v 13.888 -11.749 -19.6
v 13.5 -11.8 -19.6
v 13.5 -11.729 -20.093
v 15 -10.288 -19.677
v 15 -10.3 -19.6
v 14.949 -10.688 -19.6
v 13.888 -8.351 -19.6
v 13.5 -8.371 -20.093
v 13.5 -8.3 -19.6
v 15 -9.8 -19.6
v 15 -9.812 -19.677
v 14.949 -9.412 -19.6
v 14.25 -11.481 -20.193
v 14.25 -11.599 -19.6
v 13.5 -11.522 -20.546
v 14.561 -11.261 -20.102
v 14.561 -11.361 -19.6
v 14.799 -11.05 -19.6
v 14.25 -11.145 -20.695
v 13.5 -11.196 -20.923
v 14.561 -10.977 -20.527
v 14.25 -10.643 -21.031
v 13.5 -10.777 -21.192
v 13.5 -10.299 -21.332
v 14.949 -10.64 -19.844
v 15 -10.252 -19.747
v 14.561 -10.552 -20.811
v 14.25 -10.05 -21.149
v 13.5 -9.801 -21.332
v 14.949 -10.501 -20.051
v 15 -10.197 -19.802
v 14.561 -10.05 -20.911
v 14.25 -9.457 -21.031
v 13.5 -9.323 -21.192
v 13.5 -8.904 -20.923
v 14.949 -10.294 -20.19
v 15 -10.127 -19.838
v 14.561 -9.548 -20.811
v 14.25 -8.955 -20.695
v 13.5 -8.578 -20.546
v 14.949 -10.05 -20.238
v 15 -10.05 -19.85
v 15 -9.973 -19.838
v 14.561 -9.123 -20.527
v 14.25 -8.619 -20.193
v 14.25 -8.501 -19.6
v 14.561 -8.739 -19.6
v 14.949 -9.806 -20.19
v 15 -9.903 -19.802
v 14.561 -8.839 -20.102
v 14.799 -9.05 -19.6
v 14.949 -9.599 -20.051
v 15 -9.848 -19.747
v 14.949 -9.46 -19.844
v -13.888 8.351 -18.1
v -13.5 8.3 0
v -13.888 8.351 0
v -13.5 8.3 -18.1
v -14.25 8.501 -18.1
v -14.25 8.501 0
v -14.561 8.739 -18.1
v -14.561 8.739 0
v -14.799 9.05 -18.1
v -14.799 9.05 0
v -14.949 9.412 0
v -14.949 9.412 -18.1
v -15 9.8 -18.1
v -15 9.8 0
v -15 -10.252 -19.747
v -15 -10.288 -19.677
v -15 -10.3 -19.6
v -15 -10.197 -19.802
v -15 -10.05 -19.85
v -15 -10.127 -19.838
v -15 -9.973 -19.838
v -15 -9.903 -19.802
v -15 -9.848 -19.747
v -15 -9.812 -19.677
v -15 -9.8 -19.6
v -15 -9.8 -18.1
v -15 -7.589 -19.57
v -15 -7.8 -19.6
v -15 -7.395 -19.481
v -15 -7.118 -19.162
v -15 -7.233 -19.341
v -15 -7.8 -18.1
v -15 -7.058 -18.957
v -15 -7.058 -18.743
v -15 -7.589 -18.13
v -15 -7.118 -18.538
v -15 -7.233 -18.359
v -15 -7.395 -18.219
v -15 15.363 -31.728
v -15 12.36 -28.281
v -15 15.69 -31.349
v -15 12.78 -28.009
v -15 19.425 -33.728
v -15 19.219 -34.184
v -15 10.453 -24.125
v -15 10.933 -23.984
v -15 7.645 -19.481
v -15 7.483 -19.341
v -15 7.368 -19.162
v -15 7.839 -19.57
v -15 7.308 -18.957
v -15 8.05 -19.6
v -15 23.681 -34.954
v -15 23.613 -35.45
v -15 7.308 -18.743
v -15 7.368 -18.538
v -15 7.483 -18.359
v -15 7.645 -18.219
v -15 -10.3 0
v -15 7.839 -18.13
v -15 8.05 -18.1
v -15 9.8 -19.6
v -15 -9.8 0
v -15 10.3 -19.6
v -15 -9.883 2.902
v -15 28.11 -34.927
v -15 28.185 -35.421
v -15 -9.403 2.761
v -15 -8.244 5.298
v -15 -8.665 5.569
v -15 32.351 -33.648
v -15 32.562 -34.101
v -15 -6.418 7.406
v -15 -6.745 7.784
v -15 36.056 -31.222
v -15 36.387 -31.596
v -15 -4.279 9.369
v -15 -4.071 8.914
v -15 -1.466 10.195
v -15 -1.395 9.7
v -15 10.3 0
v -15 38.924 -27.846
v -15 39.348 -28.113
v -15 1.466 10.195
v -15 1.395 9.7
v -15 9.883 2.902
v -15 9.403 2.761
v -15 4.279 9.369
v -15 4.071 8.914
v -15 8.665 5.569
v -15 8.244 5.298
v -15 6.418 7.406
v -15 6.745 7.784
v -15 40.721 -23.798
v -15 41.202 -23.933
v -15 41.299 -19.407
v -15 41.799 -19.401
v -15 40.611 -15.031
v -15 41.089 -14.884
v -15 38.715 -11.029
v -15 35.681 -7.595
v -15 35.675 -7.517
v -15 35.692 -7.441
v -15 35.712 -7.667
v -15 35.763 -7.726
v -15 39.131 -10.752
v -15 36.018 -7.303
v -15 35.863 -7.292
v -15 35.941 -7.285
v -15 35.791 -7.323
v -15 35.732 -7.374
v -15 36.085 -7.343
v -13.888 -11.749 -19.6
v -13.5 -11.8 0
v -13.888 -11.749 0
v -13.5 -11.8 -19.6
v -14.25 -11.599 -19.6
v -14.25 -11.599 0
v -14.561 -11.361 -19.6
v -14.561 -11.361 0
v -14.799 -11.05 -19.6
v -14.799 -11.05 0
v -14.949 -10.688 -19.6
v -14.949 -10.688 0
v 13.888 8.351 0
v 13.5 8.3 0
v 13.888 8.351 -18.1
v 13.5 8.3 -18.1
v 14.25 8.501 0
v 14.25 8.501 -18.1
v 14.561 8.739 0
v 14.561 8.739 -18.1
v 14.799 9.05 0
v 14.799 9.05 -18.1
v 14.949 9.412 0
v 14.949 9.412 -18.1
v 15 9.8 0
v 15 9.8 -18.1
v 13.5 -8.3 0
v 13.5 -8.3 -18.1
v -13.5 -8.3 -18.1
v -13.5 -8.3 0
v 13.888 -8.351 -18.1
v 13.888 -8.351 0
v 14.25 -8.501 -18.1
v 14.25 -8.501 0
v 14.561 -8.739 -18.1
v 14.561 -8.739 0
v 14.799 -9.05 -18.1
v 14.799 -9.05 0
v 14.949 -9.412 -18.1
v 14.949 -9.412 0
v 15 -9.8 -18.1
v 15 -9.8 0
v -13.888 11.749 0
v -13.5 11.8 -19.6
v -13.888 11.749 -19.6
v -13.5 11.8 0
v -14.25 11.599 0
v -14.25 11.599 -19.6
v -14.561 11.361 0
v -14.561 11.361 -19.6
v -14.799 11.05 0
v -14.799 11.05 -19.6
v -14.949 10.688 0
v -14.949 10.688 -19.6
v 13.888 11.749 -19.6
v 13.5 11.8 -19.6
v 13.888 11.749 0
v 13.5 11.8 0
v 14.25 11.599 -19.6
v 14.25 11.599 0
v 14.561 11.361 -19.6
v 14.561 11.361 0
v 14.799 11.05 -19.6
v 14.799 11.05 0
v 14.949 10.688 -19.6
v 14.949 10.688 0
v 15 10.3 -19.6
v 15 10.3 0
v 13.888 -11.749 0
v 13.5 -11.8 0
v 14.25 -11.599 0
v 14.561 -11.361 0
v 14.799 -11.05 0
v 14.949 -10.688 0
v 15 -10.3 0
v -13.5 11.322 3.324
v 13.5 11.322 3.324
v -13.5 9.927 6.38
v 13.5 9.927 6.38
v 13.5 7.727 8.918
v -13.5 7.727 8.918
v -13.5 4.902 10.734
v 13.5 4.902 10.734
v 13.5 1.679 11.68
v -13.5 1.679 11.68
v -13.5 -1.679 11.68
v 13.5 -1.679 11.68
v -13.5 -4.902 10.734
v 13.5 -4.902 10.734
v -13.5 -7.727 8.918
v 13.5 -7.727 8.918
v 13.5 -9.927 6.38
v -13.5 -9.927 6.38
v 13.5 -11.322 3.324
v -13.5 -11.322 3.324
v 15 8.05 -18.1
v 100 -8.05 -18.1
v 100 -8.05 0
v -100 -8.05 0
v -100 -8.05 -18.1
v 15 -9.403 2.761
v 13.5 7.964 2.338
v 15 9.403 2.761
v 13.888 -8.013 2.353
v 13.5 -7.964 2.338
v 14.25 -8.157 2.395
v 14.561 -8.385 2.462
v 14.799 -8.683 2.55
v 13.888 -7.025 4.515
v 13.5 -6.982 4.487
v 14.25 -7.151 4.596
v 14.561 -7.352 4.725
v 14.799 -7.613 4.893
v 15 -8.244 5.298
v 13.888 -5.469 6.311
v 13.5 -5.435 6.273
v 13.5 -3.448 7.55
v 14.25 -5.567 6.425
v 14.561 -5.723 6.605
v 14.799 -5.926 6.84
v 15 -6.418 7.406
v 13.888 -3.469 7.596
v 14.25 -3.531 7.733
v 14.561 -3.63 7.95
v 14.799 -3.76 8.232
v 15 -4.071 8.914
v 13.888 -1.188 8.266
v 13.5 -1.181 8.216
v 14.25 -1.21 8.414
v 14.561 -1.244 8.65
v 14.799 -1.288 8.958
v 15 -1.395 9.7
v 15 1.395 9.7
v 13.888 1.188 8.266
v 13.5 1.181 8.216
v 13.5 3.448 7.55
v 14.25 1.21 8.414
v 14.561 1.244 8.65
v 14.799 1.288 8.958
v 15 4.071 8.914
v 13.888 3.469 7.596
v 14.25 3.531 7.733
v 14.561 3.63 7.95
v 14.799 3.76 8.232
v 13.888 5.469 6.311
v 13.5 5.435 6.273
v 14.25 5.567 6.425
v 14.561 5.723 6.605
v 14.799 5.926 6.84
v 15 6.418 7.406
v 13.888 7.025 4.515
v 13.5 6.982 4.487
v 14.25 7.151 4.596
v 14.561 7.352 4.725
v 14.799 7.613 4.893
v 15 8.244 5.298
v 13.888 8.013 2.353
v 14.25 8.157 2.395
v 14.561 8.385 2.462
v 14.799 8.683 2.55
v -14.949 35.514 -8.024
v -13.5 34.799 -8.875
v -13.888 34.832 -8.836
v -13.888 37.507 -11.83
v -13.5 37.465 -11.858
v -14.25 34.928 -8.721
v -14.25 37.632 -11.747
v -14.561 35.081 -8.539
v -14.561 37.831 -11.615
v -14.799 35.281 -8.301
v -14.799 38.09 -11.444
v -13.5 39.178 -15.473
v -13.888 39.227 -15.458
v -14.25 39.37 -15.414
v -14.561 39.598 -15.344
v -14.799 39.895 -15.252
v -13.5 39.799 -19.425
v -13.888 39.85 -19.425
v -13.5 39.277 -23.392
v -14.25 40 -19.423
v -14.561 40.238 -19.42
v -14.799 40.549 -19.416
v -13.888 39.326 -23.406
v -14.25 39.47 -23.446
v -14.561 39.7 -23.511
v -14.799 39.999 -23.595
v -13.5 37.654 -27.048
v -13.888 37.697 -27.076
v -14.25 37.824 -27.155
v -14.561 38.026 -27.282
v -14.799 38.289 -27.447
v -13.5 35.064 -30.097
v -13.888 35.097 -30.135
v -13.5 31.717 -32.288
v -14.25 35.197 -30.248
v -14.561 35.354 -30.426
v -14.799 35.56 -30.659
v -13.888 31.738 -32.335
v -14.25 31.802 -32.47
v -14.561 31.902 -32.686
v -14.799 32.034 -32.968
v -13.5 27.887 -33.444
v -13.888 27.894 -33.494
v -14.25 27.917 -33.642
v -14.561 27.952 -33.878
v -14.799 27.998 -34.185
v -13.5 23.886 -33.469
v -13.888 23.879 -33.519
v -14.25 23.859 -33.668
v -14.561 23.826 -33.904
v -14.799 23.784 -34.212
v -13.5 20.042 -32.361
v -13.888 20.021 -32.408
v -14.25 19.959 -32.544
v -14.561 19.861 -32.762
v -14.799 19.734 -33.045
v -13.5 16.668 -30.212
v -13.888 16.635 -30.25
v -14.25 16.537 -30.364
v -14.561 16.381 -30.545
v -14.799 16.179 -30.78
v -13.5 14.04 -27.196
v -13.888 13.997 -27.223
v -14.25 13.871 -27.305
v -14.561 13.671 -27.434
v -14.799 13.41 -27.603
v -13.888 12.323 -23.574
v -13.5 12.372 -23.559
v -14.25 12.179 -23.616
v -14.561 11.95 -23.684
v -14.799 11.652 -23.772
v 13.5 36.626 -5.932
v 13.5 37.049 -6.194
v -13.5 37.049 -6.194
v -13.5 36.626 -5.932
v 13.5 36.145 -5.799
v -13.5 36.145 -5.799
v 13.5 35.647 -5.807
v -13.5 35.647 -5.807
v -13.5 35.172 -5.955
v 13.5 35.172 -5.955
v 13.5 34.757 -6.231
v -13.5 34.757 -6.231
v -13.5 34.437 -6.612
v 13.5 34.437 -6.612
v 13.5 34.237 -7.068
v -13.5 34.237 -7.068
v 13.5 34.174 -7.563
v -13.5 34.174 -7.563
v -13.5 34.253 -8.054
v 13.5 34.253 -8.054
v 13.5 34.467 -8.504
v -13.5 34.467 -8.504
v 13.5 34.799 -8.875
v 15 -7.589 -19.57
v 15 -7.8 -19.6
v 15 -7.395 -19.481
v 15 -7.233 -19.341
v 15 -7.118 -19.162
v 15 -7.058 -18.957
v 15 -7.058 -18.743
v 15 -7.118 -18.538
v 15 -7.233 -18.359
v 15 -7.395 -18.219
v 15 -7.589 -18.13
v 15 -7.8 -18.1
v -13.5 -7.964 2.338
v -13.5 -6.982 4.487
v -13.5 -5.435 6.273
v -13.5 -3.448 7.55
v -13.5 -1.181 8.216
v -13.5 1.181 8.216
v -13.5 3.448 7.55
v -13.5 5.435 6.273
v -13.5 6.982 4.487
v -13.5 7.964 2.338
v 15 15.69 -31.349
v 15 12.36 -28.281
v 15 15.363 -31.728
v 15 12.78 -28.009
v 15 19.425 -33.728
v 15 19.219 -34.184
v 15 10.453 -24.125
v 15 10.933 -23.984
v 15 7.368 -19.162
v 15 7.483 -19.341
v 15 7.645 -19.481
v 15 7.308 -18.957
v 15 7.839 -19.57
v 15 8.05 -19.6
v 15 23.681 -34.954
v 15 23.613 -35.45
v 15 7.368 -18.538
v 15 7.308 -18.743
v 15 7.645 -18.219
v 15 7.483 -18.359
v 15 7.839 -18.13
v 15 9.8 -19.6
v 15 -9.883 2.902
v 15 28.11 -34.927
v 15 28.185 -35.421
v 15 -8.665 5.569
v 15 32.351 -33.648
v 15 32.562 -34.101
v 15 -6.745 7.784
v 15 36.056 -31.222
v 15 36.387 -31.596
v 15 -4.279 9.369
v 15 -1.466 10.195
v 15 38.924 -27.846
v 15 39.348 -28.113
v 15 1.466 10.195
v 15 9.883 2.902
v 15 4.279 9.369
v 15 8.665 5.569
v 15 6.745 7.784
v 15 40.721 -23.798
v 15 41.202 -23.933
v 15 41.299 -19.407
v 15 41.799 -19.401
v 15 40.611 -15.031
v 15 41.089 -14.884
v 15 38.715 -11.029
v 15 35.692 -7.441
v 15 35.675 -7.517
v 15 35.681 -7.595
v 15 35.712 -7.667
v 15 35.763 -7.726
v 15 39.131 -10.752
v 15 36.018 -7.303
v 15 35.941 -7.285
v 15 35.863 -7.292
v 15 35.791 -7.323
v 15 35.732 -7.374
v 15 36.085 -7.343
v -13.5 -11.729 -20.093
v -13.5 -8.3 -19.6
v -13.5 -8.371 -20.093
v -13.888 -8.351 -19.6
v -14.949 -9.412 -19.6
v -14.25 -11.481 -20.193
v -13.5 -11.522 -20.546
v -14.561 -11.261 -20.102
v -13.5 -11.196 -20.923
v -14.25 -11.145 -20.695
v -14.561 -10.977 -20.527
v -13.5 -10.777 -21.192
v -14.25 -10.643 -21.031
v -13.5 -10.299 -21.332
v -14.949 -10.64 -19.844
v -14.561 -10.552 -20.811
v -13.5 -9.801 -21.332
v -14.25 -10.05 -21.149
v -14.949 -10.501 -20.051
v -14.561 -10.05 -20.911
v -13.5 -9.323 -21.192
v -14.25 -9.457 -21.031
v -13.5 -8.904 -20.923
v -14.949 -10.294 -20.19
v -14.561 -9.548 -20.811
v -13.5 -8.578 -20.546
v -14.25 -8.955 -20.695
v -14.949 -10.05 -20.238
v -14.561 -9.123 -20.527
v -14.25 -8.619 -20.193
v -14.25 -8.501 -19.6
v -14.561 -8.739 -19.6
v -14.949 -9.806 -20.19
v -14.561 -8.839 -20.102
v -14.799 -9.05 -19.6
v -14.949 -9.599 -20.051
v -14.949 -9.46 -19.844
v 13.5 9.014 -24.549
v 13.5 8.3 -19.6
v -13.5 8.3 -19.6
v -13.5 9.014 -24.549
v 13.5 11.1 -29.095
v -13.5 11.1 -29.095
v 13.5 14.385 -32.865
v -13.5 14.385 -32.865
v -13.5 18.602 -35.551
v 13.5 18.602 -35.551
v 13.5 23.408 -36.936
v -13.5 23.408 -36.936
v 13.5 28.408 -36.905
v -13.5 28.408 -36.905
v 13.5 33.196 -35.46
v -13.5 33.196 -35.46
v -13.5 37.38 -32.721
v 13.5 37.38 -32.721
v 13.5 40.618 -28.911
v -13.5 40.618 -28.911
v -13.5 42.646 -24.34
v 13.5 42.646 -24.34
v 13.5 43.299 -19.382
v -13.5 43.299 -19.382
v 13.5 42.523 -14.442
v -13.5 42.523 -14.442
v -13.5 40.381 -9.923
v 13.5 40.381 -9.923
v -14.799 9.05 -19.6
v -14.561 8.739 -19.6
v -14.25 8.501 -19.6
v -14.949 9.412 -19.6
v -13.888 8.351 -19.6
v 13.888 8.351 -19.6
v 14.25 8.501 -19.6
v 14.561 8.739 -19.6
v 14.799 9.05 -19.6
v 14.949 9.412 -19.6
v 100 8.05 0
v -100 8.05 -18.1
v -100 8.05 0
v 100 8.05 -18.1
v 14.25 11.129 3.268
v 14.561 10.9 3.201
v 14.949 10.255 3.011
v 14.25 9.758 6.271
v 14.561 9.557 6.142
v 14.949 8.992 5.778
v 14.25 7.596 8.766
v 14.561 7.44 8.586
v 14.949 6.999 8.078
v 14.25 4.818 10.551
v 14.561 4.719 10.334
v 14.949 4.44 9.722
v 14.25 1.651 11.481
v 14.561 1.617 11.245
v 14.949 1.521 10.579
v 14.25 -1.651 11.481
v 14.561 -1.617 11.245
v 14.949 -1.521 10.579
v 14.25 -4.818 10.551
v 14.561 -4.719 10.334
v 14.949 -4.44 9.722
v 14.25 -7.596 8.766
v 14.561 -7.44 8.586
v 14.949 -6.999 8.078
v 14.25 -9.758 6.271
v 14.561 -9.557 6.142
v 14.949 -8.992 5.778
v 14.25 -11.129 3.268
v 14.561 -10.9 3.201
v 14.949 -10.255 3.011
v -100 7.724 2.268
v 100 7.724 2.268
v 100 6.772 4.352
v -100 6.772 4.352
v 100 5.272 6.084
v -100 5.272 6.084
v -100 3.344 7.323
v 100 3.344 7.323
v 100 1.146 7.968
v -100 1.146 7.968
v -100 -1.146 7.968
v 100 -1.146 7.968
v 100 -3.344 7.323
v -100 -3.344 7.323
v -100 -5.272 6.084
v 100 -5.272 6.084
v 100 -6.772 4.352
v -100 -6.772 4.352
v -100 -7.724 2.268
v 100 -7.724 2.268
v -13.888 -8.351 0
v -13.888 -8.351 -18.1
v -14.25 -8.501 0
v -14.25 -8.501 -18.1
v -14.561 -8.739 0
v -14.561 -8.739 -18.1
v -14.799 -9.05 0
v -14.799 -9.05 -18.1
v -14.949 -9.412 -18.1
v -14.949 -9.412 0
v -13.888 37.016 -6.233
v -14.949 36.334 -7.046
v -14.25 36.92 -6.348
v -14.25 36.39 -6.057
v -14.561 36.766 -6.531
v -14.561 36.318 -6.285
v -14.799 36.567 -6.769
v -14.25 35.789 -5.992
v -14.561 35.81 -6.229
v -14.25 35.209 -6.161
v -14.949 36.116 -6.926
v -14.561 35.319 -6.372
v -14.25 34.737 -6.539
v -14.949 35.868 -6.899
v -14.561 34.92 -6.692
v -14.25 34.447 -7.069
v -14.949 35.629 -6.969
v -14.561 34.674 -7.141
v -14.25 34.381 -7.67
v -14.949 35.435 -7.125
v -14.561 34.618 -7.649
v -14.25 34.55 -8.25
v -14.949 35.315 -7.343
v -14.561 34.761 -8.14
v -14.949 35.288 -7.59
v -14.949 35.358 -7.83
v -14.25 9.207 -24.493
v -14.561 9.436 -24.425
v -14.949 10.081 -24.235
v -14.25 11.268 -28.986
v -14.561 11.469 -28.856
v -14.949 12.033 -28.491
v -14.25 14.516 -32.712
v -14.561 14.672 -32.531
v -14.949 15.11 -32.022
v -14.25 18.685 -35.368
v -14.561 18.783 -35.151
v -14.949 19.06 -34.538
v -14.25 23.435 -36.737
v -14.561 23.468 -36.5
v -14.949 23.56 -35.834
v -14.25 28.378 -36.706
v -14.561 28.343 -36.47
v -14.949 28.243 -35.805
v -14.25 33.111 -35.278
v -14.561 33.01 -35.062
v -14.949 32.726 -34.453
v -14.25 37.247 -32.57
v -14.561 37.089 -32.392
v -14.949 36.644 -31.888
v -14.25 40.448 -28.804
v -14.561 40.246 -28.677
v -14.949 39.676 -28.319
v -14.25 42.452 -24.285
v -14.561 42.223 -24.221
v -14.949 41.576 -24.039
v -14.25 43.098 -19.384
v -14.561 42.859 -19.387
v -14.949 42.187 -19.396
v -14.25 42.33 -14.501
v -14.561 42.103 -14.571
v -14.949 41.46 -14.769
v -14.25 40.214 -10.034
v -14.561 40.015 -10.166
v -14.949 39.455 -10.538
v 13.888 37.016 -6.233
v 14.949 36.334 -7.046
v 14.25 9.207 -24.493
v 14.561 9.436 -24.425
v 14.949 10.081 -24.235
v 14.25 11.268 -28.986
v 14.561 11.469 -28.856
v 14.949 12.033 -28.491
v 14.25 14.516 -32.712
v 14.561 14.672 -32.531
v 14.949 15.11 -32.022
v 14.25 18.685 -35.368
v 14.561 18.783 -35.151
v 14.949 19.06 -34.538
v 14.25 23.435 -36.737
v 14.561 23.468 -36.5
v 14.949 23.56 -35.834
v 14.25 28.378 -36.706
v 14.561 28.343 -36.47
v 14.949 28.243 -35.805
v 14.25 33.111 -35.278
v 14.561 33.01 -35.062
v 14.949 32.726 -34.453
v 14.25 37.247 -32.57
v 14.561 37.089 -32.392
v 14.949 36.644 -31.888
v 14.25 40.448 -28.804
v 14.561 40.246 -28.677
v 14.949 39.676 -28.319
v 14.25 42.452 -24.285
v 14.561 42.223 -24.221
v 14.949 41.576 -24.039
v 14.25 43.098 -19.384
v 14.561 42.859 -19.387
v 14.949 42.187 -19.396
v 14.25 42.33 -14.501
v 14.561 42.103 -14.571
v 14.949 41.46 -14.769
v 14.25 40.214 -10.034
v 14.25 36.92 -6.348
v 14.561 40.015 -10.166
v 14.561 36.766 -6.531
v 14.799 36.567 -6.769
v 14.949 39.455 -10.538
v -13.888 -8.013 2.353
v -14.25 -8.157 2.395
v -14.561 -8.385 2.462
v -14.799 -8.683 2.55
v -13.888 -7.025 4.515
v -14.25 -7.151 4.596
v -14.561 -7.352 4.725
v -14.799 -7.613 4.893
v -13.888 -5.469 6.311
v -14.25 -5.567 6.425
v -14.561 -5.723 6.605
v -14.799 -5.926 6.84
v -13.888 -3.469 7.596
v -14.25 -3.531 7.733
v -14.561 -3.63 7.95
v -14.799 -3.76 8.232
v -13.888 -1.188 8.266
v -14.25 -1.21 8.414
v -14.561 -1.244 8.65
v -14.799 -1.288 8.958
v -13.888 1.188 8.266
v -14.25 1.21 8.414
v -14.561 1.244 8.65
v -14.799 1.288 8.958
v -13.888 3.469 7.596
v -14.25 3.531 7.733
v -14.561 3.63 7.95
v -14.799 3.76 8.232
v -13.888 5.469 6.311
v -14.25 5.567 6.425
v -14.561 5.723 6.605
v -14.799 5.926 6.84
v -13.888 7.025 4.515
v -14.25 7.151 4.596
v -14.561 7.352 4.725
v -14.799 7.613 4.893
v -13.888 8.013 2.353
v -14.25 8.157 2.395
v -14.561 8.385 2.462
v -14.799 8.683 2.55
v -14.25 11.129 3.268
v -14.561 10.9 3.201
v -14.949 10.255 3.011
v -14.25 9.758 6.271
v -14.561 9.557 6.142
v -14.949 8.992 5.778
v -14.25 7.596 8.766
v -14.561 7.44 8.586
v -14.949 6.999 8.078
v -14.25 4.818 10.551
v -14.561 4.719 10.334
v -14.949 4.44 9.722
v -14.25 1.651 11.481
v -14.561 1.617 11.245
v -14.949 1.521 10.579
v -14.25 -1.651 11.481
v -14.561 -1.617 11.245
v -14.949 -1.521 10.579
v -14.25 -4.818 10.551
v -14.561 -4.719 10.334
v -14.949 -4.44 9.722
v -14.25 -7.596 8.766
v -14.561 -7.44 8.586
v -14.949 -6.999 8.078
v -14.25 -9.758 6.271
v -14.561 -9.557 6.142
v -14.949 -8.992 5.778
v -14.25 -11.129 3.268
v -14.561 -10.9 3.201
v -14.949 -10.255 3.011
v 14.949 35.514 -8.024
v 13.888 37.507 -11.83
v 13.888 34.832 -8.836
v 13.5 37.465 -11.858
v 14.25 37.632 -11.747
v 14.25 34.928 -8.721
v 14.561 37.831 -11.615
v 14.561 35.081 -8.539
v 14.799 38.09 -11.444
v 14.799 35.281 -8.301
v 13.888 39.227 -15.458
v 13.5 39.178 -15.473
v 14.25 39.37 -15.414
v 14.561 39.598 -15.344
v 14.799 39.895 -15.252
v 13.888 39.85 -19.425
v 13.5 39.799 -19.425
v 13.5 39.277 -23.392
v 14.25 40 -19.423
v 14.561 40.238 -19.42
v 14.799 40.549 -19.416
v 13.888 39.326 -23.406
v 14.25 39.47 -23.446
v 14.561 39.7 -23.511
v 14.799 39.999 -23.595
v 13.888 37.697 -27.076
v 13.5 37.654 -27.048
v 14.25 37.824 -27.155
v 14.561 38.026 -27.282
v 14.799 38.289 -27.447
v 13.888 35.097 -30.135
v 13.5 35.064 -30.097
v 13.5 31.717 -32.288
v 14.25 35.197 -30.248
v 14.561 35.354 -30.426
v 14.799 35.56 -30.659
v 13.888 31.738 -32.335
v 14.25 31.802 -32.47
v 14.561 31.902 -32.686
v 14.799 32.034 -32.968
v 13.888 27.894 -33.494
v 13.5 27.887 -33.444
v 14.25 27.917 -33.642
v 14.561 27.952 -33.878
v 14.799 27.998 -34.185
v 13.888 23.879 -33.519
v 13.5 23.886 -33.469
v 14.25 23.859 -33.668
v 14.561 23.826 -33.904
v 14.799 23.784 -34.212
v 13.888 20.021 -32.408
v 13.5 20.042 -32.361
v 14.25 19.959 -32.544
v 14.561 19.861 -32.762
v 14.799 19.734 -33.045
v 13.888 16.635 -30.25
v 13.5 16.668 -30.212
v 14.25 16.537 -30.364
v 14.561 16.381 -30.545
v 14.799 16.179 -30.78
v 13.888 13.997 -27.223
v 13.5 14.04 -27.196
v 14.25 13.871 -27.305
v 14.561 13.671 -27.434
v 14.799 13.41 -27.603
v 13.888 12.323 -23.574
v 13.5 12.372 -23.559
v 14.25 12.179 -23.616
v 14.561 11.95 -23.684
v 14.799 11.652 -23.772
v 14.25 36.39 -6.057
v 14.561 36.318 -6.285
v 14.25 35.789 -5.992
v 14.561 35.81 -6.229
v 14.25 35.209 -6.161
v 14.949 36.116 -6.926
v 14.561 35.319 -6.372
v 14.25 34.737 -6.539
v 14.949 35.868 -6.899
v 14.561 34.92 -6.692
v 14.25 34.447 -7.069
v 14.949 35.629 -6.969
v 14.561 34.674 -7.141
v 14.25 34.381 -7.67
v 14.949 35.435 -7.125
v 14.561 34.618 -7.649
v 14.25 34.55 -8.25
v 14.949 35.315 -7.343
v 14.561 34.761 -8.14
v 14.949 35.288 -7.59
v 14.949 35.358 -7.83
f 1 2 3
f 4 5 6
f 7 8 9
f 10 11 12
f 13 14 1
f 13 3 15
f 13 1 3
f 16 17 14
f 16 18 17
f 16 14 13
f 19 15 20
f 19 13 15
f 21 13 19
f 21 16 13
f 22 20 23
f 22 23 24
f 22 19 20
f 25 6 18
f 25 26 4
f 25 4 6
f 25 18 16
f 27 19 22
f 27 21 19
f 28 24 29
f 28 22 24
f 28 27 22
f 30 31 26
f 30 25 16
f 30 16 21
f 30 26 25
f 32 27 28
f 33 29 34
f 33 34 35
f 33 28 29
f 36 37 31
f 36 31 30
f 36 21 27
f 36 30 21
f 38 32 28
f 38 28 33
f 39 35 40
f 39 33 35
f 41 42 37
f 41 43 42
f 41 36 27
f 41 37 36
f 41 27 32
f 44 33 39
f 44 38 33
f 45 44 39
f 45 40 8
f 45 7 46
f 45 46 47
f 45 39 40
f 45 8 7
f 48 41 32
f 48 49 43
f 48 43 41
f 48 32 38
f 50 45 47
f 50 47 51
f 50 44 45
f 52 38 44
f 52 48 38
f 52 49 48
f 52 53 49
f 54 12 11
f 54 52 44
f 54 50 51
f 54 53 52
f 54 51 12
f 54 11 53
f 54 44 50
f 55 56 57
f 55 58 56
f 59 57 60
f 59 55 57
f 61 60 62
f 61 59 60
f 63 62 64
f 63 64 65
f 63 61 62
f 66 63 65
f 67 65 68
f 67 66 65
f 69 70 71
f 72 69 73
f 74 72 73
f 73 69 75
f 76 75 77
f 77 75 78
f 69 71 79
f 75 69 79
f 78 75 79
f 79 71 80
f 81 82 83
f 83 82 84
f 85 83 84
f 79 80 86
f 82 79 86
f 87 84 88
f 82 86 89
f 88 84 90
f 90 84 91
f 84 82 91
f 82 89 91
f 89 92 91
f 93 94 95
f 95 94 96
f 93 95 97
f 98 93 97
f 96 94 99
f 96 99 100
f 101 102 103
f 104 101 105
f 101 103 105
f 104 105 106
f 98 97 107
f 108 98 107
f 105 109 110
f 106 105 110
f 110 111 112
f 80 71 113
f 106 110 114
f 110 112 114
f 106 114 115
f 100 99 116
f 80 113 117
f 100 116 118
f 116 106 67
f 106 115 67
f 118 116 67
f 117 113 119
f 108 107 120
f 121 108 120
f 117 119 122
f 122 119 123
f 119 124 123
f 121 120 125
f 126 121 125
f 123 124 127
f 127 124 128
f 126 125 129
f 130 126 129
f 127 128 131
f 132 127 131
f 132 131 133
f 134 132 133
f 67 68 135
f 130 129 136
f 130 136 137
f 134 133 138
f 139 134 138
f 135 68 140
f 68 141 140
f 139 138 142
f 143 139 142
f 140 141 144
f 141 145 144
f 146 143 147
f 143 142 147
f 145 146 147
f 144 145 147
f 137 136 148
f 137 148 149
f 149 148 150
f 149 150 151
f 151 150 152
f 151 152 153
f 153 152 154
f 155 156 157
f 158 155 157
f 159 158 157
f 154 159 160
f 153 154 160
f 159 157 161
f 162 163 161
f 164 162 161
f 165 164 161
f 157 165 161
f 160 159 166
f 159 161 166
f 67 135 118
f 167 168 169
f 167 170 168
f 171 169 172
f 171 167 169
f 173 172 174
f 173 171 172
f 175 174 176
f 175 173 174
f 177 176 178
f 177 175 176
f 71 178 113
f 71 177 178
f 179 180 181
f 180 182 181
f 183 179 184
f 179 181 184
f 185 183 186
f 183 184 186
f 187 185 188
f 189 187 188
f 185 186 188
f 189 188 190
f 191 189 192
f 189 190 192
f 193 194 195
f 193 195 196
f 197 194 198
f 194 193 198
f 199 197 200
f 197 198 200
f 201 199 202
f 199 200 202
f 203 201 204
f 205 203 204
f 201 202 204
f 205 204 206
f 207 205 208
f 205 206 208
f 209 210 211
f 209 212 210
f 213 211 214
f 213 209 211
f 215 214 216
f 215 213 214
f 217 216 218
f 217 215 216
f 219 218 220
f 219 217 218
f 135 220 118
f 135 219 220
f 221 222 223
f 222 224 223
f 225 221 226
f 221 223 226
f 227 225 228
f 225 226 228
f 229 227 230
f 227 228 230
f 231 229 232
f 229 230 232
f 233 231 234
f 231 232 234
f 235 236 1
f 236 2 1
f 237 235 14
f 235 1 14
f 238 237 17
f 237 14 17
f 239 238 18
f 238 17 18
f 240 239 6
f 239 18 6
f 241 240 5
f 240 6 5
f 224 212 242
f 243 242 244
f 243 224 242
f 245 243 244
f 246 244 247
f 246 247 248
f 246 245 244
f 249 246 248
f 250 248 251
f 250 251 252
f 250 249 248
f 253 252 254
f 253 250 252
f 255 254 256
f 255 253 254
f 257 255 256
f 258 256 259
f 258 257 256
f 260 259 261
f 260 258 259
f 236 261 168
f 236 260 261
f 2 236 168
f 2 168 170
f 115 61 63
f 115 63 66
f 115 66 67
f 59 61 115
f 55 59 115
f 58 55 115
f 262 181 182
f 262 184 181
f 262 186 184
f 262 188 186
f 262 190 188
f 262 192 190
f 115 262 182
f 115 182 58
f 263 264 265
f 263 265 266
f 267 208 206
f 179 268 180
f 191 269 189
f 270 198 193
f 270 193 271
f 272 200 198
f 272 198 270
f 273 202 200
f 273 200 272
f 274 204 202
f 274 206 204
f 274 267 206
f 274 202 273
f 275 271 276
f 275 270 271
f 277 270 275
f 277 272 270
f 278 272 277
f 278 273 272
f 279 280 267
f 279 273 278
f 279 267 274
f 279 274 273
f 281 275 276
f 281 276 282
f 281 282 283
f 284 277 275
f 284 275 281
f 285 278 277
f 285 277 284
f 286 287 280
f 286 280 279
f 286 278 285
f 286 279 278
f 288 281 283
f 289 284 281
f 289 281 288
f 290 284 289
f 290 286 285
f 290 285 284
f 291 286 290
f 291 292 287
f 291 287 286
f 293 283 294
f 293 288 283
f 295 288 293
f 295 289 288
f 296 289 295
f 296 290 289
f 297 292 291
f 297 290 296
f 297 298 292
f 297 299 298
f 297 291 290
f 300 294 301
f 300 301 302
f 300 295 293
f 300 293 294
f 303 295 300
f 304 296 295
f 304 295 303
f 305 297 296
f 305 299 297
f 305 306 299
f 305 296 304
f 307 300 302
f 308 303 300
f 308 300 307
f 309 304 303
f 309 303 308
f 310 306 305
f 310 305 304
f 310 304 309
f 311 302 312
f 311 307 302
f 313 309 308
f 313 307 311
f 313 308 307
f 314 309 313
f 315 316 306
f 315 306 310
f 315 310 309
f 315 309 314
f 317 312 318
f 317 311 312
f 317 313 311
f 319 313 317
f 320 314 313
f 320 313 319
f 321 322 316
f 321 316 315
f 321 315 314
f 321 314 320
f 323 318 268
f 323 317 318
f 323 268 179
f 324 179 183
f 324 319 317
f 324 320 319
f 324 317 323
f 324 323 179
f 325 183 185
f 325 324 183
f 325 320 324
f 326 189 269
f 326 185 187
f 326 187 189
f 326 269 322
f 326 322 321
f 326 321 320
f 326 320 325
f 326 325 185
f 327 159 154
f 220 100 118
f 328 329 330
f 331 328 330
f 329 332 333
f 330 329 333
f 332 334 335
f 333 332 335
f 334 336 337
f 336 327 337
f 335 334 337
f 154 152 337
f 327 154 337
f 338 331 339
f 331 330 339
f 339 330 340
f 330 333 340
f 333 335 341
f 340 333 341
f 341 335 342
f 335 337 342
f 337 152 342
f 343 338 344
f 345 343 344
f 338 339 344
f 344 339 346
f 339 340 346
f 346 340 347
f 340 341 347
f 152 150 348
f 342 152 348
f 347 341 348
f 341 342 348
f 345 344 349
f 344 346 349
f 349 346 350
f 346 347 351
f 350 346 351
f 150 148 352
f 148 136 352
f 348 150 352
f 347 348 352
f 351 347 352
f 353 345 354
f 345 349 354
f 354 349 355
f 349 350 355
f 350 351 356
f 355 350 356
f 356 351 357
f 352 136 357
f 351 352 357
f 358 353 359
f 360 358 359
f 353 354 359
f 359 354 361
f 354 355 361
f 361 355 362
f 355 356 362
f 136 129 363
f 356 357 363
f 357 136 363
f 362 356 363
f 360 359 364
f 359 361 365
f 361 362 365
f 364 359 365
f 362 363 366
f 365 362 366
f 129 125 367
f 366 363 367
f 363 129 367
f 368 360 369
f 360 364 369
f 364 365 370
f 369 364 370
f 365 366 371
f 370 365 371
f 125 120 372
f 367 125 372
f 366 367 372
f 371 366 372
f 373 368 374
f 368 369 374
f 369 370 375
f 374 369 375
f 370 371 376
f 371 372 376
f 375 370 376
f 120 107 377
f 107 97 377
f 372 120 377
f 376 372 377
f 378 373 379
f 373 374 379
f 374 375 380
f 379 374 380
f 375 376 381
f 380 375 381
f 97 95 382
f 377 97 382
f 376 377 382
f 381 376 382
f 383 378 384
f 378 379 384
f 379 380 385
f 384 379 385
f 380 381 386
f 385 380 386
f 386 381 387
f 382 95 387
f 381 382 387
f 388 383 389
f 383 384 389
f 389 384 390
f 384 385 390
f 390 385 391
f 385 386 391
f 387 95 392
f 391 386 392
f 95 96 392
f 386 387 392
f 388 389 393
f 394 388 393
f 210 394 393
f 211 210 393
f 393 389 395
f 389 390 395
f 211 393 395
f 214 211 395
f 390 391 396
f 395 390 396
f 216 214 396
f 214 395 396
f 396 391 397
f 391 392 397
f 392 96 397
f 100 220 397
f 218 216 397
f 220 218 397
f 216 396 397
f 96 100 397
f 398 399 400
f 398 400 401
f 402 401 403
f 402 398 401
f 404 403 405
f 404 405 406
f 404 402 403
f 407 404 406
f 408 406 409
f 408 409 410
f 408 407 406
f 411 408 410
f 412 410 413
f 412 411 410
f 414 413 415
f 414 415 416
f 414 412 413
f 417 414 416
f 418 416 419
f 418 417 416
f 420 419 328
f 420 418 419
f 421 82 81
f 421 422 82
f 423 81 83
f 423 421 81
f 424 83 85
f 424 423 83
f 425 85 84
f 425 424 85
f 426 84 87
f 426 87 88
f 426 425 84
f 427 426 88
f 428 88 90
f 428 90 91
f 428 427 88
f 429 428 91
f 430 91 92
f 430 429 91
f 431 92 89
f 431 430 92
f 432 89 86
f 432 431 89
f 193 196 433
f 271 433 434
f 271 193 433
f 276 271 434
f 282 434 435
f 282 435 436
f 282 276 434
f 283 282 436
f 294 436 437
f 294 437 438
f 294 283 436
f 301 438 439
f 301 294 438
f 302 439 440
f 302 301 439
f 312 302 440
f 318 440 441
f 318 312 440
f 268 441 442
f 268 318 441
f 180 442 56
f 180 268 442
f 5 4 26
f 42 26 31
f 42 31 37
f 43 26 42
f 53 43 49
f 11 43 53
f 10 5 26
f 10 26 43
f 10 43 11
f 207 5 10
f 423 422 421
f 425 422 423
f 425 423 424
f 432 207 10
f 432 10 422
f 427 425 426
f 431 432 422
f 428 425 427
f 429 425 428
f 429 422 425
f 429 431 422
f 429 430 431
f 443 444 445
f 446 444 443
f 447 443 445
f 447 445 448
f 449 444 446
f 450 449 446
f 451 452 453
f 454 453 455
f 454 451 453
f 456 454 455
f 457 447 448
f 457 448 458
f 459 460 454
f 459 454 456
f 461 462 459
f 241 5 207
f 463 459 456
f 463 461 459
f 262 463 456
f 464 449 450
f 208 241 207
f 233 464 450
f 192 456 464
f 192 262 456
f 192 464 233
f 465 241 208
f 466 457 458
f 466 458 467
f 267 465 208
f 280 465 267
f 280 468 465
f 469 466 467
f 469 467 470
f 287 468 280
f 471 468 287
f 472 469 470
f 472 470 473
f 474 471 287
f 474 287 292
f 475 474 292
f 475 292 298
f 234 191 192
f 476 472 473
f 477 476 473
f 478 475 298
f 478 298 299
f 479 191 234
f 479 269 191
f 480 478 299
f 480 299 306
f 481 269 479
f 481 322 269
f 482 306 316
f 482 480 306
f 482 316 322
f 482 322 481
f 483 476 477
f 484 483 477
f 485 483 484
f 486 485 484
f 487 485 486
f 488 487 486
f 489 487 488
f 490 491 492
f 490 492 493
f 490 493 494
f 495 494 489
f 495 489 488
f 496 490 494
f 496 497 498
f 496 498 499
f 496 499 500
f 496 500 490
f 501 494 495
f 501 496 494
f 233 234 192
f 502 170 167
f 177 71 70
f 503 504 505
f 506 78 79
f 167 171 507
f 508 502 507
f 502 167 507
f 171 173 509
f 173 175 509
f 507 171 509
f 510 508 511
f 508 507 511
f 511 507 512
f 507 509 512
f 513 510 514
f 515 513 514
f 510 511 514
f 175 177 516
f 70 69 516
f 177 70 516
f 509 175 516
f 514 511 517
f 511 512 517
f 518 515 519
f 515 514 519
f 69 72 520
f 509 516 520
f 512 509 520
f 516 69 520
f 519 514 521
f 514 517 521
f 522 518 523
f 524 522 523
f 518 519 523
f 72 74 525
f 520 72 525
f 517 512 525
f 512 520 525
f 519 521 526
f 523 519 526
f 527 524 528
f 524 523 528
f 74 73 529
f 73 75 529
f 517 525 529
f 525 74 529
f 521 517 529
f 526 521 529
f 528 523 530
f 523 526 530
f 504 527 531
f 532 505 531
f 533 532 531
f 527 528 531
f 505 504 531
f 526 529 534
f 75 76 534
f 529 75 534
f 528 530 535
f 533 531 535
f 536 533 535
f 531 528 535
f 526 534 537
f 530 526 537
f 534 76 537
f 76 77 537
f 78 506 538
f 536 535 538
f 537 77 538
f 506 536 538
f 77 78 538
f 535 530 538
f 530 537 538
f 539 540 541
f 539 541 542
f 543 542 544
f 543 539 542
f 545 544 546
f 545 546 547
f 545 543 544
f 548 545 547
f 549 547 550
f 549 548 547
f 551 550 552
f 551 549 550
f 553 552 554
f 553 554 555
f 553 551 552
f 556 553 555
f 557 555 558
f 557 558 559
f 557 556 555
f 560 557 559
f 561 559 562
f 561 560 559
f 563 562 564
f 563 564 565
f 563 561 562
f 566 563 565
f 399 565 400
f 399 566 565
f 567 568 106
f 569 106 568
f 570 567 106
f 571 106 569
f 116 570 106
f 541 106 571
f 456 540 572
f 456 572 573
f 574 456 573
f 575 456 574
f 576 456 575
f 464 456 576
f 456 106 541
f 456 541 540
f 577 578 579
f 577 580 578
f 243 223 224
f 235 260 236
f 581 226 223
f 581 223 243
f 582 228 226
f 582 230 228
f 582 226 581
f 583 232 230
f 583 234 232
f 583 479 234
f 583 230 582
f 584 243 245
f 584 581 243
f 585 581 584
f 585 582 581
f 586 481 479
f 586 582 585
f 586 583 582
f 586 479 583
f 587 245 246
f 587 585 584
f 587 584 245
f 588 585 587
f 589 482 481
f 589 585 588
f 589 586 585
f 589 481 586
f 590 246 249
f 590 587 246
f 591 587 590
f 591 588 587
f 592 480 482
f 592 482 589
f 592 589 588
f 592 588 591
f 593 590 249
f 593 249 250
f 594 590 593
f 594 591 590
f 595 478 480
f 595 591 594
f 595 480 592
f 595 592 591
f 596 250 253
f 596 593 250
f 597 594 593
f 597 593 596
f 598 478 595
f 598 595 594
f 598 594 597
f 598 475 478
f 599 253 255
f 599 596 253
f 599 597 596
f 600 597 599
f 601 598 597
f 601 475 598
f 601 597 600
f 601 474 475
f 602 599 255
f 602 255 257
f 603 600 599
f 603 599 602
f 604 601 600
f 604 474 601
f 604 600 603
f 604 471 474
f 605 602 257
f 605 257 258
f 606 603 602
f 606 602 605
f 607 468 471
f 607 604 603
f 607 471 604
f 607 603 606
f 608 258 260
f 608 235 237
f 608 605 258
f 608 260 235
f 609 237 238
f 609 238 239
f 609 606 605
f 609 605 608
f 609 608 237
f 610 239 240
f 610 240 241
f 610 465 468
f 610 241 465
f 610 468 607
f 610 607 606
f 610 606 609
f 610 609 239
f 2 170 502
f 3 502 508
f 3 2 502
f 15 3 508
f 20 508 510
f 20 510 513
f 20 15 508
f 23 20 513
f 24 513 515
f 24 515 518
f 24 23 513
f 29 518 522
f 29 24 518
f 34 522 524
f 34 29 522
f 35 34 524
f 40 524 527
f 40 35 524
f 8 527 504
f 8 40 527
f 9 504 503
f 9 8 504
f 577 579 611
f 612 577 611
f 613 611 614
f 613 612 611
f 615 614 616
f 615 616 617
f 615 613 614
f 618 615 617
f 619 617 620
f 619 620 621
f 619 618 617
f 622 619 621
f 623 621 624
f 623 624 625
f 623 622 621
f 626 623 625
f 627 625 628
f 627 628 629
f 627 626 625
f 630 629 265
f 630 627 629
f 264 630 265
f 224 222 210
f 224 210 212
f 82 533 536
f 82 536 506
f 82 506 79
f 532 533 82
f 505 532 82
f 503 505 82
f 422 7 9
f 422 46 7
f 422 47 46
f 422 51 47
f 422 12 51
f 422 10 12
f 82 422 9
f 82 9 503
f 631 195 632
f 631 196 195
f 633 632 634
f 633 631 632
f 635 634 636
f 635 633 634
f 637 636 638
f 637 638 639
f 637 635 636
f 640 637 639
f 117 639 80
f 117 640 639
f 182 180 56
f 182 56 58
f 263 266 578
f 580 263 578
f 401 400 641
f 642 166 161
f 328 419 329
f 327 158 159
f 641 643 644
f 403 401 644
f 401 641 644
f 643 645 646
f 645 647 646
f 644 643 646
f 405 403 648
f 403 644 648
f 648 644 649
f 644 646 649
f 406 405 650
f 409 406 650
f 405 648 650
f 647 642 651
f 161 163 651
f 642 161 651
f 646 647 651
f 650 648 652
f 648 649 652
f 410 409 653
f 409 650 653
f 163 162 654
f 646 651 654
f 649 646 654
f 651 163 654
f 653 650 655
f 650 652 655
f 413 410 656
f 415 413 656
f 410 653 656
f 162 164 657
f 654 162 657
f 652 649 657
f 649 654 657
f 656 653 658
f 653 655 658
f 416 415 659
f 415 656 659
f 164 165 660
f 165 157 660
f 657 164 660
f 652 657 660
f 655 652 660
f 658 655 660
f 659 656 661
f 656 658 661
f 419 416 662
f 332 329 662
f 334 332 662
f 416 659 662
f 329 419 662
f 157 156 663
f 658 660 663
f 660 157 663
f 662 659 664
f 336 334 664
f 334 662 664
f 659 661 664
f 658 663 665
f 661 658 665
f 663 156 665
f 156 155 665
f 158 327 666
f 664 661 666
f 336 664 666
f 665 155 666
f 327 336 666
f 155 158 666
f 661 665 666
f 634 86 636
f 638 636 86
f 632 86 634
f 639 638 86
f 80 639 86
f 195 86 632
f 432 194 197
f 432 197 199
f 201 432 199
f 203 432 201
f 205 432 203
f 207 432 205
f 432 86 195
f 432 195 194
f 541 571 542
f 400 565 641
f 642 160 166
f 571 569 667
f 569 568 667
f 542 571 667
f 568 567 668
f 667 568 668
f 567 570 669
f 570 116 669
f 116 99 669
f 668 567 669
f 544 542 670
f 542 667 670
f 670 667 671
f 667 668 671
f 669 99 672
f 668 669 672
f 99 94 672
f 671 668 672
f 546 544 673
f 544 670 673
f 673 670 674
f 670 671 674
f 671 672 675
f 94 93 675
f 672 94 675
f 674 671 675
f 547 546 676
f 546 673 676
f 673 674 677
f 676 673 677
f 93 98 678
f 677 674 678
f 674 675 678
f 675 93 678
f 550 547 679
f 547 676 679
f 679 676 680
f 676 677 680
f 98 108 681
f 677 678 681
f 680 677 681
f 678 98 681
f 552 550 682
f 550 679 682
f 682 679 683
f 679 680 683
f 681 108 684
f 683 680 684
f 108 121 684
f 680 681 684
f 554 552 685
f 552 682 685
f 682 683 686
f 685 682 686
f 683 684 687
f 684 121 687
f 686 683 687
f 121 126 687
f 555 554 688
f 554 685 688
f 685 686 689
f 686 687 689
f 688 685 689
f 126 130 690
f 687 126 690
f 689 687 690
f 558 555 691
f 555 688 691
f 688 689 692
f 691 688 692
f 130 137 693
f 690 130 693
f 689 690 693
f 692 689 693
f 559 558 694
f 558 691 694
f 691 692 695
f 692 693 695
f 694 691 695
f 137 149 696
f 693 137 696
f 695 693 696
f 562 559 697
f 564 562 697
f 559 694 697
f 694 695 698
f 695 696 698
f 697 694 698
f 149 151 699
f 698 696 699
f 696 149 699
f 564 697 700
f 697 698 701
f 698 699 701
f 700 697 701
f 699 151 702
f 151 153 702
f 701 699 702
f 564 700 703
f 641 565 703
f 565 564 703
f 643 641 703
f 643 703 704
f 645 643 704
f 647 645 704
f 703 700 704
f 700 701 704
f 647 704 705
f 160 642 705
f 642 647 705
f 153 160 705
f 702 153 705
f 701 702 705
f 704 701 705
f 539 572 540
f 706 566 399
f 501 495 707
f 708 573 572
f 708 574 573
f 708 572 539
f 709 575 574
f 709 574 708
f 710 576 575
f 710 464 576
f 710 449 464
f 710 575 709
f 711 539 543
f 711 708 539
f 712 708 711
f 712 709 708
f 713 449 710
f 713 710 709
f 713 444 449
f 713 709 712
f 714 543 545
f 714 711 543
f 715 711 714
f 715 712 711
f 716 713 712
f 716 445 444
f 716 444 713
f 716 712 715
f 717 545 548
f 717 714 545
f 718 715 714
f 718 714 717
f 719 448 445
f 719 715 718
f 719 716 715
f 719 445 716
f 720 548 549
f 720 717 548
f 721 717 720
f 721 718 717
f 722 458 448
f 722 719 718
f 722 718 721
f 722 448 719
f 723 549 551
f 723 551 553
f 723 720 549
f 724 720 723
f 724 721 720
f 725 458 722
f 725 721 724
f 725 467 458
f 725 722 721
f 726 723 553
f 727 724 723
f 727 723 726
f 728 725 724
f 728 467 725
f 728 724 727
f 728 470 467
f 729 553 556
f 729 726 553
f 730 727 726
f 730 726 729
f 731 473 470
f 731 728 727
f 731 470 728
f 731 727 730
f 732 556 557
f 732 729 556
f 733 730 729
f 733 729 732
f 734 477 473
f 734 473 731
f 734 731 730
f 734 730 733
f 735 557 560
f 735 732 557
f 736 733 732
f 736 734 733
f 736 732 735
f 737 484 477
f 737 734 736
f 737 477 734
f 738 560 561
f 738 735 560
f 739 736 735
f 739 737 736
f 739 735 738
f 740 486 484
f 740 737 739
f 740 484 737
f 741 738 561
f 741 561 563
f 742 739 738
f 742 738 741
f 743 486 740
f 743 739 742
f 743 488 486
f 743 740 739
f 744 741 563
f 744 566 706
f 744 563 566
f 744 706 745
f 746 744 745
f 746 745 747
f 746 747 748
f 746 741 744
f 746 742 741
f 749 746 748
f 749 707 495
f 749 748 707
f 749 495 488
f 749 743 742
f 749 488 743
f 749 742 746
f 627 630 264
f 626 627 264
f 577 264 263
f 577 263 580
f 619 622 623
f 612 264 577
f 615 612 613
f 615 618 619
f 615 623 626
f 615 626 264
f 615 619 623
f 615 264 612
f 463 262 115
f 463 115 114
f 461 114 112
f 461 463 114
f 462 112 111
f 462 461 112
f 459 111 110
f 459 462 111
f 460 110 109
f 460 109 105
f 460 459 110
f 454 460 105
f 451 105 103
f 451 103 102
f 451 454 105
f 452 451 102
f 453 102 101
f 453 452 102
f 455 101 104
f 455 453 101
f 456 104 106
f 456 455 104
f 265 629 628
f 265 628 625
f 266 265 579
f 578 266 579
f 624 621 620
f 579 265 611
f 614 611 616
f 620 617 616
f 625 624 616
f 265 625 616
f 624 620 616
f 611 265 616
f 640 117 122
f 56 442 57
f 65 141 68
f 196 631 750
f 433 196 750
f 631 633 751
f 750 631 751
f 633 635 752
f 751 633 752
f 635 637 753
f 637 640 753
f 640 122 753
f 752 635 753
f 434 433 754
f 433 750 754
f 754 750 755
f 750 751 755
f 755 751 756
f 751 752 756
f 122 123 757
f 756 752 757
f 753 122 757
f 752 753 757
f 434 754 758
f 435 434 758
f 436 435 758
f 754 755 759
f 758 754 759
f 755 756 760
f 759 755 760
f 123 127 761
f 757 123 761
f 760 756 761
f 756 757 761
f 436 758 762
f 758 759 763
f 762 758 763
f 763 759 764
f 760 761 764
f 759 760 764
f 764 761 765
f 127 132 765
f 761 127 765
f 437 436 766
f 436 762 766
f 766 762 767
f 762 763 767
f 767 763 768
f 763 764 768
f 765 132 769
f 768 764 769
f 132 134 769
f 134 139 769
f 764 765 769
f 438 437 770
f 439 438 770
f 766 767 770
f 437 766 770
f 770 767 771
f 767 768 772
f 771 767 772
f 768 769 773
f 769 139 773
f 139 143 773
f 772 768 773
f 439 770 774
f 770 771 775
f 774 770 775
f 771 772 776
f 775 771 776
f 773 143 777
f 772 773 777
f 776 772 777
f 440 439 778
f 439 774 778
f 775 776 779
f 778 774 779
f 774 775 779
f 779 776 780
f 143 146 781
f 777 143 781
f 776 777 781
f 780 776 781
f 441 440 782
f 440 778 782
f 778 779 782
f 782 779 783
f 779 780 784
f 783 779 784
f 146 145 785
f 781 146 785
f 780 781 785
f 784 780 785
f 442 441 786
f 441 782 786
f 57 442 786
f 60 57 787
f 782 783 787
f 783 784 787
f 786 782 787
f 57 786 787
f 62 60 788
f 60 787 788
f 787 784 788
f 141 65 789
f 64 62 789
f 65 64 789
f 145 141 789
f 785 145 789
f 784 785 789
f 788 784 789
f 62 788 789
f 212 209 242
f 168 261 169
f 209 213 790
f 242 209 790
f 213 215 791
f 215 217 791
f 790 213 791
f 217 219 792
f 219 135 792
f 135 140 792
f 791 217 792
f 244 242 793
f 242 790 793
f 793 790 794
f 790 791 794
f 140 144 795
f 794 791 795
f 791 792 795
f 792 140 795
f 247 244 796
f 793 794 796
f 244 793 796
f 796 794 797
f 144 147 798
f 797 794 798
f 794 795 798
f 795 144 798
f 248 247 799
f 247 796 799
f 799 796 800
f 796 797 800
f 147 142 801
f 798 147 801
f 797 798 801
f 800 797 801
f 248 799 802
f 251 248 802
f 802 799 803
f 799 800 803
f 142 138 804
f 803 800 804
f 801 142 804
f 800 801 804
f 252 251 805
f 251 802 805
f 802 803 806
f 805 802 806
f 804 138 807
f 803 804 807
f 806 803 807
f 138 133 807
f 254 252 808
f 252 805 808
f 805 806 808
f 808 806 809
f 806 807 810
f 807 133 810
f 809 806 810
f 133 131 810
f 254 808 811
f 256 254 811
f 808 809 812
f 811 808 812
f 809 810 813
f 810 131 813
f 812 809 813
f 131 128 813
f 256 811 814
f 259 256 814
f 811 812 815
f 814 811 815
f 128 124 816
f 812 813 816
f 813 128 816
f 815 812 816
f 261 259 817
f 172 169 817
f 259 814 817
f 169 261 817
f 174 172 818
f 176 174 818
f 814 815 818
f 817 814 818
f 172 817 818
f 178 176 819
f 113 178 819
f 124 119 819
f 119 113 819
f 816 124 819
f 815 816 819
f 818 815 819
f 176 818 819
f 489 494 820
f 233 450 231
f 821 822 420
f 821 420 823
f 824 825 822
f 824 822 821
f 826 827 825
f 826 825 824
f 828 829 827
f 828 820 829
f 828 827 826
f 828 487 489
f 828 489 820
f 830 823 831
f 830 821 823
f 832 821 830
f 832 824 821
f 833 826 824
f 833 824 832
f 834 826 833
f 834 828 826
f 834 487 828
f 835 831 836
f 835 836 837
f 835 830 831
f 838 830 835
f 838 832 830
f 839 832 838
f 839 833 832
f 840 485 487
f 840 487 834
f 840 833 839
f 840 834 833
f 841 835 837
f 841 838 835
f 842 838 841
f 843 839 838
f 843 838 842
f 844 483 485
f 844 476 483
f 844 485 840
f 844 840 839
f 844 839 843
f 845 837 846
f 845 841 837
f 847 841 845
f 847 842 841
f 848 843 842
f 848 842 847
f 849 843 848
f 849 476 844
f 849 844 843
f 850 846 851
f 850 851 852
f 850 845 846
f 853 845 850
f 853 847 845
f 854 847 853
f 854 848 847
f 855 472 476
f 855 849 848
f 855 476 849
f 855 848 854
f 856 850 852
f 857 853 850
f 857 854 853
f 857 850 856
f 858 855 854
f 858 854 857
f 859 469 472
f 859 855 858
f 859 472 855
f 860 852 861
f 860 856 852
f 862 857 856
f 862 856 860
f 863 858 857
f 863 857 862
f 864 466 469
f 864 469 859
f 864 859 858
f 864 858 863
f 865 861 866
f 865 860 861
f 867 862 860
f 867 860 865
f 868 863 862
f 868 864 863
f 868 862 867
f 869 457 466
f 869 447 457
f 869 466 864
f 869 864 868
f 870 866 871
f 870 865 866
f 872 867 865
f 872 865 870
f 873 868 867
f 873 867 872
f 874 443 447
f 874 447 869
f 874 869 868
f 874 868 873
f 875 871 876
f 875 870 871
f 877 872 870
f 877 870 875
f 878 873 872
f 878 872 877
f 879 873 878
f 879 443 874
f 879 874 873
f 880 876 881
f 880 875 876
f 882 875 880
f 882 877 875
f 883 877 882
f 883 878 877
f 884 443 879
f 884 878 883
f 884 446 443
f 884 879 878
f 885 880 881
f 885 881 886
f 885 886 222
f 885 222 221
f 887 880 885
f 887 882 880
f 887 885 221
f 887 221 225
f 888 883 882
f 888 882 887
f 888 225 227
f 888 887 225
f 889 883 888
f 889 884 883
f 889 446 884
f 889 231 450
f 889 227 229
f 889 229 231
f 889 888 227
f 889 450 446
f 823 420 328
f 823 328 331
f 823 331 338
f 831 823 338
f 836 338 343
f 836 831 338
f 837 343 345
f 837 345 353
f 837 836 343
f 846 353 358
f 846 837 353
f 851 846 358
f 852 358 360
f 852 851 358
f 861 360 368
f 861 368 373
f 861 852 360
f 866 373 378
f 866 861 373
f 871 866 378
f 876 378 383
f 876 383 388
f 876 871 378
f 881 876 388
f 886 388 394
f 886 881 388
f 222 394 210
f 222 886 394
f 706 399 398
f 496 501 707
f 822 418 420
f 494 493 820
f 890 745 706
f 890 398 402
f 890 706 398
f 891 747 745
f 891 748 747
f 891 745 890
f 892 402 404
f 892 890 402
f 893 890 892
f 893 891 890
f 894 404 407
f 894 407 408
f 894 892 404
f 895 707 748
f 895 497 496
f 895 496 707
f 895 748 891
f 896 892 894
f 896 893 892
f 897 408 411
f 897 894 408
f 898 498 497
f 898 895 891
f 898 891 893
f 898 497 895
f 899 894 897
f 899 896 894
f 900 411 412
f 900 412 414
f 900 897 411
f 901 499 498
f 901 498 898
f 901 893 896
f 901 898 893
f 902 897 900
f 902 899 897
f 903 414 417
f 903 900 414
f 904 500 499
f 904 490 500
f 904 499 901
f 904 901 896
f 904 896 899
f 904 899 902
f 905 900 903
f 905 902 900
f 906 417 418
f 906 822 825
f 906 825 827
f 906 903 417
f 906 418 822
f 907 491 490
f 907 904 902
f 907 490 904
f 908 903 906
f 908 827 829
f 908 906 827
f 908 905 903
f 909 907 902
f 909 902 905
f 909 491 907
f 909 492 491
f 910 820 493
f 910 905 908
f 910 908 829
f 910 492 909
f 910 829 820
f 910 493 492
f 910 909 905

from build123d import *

# Parameters (mm, degrees)
F1_DEPTH = 100
F3_DEPTH = 15
F4_R     = 1.5


with BuildPart() as f1:
    # F0 (on Right) → F1 (new body, symmetric)
    with BuildSketch(Plane.YZ):
        with BuildLine():
            Line((8.05, -18.1), (8.05, 0))
            ThreePointArc((8.05, 0), (0, 8.05), (-8.05, 0))
            Line((-8.05, 0), (-8.05, -18.1))
            Line((-8.05, -18.1), (8.05, -18.1))
        make_face()
    extrude(amount=F1_DEPTH, both=True)


with BuildPart() as f3:
    # F2 (on Right) → F3 (new body, symmetric)
    with BuildSketch(Plane.YZ):
        with BuildLine():
            Line((-8.3, -19.6), (-8.3, -18.1))
            Line((-8.3, -18.1), (-8.3, 0))
            ThreePointArc((-8.3, 0), (0, 8.3), (8.3, 0))
            Line((8.3, 0), (8.3, -18.1))
            Line((8.3, -18.1), (8.3, -19.6))
            Line((8.3, -19.6), (11.8, -19.6))
            Line((11.8, -19.6), (11.8, 0))
            ThreePointArc((11.8, 0), (0, 11.8), (-11.8, 0))
            Line((-11.8, 0), (-11.8, -19.6))
            Line((-11.8, -19.6), (-8.3, -19.6))
        make_face()
        with BuildLine():
            Line((11.8, -19.6), (8.3, -19.6))
            ThreePointArc((8.3, -19.6), (33.19582, -35.460386), (37.048783, -6.194222))
            ThreePointArc((37.048783, -6.194222), (34.583327, -6.409922), (34.799027, -8.875378))
            ThreePointArc((34.799027, -8.875378), (31.716656, -32.288309), (11.8, -19.6))
        make_face()
        with BuildLine():
            Line((8.3, -18.1), (8.05, -18.1))
            ThreePointArc((8.05, -18.1), (7.3, -18.85), (8.05, -19.6))
            Line((8.05, -19.6), (8.3, -19.6))
            Line((8.3, -19.6), (8.3, -18.1))
        make_face()
        with BuildLine():
            ThreePointArc((-11.8, -19.6), (-10.05, -21.35), (-8.3, -19.6))
            Line((-8.3, -19.6), (-11.8, -19.6))
        make_face()
        with BuildLine():
            Line((-7.8, -18.1), (-8.05, -18.1))
            Line((-8.05, -18.1), (-8.3, -18.1))
            Line((-8.3, -18.1), (-8.3, -19.6))
            Line((-8.3, -19.6), (-7.8, -19.6))
            ThreePointArc((-7.8, -19.6), (-7.05, -18.85), (-7.8, -18.1))
        make_face()
    extrude(amount=F3_DEPTH, both=True)

    # F4
    f4_edges = [f3.edges().sort_by_distance(p)[0] for p in [
        (15, 31.716656, -32.288309),
        (15, -8.3, -9.05),
        (-15, -11.8, -9.8),
        (-15, -8.3, -9.05),
    ]]
    fillet(f4_edges, radius=F4_R)


solid = Compound([f1.part, f3.part])
